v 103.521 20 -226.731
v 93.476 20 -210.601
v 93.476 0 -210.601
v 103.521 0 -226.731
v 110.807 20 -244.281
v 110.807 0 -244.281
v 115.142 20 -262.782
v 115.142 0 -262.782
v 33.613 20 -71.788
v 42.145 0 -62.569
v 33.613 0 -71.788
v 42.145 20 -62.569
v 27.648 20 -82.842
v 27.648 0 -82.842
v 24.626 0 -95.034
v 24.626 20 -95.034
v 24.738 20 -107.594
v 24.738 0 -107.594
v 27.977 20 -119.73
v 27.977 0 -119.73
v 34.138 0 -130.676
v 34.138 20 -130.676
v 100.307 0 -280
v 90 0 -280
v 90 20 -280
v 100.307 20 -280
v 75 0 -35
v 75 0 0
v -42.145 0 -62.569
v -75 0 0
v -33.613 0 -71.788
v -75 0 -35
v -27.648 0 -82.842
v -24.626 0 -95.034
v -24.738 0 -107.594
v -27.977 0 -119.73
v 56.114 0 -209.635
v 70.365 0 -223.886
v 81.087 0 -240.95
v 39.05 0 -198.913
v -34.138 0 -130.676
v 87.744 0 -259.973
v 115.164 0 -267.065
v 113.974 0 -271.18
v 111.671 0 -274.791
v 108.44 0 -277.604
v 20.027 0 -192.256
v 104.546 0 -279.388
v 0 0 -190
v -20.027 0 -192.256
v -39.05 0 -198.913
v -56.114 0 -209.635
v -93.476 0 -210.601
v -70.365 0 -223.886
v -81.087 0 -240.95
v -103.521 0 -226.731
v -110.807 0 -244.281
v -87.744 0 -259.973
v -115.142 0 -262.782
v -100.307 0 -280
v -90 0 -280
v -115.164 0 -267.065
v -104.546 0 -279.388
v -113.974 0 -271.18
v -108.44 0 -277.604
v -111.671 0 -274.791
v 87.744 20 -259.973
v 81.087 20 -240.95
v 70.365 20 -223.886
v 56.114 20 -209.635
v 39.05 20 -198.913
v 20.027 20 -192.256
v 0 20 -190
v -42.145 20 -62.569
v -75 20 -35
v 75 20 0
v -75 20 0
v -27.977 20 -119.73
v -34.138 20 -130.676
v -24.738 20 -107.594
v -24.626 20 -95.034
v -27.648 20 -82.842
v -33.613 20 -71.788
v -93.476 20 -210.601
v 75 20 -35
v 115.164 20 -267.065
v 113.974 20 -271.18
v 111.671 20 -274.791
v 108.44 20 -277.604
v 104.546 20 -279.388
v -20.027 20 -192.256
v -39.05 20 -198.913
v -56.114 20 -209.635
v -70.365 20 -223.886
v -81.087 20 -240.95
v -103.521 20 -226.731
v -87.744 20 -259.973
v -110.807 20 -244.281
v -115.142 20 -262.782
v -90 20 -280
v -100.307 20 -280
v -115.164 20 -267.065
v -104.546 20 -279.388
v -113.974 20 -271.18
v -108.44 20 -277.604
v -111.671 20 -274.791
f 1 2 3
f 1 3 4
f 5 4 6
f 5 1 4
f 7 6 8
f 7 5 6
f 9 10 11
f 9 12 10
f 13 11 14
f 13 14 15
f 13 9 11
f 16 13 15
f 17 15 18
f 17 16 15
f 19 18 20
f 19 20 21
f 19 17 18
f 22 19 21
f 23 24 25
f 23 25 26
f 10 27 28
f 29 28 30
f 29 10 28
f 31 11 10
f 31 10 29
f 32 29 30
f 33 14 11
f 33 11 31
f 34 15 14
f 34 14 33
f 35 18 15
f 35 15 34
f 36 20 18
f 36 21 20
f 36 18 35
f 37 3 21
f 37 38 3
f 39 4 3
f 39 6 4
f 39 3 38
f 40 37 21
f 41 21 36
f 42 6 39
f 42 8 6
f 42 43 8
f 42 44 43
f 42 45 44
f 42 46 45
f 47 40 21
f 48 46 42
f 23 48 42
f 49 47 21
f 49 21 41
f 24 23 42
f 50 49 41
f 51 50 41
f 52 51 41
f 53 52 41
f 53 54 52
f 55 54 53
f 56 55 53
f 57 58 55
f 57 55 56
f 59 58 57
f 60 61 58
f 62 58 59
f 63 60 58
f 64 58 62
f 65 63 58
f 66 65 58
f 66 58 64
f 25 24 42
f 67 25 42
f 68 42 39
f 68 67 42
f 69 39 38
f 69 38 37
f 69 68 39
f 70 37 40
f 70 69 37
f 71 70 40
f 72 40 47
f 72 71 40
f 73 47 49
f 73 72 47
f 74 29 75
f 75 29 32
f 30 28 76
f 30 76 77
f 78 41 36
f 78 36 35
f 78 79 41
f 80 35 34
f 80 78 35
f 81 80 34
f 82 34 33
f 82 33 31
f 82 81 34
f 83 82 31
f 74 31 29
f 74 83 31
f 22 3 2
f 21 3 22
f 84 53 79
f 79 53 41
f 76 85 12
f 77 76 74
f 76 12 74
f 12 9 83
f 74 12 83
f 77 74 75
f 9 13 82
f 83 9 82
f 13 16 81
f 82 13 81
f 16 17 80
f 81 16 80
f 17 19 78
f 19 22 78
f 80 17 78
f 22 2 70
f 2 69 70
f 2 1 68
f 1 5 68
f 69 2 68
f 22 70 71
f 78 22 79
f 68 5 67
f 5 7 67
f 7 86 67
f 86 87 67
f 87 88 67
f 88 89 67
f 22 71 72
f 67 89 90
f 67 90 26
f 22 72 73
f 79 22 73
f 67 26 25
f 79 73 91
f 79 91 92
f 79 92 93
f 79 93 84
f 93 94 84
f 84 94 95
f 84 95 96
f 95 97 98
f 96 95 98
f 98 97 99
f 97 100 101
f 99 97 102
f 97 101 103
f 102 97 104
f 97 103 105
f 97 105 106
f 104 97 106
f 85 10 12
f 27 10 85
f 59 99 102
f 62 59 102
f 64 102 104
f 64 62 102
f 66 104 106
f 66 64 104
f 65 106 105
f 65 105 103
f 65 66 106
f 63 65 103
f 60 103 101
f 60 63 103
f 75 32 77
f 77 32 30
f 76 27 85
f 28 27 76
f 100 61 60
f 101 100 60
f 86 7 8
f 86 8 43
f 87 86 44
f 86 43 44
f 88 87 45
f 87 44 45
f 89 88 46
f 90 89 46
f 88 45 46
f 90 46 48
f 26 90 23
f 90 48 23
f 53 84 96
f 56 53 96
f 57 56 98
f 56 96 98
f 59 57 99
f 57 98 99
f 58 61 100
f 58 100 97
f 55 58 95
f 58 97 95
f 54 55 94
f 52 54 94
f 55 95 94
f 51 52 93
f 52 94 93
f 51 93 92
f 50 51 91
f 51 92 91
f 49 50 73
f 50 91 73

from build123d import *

# Parameters (mm, degrees)
BOSS_EXTRUDE1_DEPTH  = 20
FILLET1_R            = 50
CUT_EXTRUDE3_DEPTH   = 20
FILLET3_R            = 15
FILLET1_OF_MIRROR2_R = 50
FILLET3_OF_MIRROR2_R = 15


with BuildPart() as part:
    # Sketch1 → Boss-Extrude1 (new body)
    with BuildSketch(Plane(origin=(0, 0, 0), x_dir=(1, 0, 0), z_dir=(0, 1, 0))):
        Polygon((-75, 35), (-75, 0), (0, 0), (0, 280), (-145, 280), (-6.056000119, 92.850884872), align=None)
    boss_extrude1 = extrude(amount=BOSS_EXTRUDE1_DEPTH)

    # Fillet1
    fillet1_edges = [part.edges().sort_by_distance(p)[0] for p in [
        (-6.056000119, 10, -92.850884872),
    ]]
    fillet(fillet1_edges, radius=FILLET1_R)

    # Sketch5 → Cut-Extrude3 (cut)
    with BuildSketch(Plane(origin=(0, 20, 0), x_dir=(1, 0, 0), z_dir=(0, 1, 0))):
        with BuildLine():
            Line((0, 190), (0, 280))
            Line((0, 280), (-90, 280))
            ThreePointArc((-90, 280), (-63.639610307, 216.360389693), (0, 190))
        make_face()
        with BuildLine():
            Line((-145, 280), (-93.476414041, 210.60086417))
            ThreePointArc((-93.476414041, 210.60086417), (-110.536849713, 243.452976984), (-116.421991204, 280))
            Line((-116.421991204, 280), (-145, 280))
        make_face()
    cut_extrude3 = extrude(amount=-CUT_EXTRUDE3_DEPTH, mode=Mode.SUBTRACT)

    # Fillet3
    fillet3_edges = [part.edges().sort_by_distance(p)[0] for p in [
        (-116.421991204, 10, -280),
    ]]
    fillet(fillet3_edges, radius=FILLET3_R)

    # Mirror2: Boss-Extrude1, Cut-Extrude3 across plane
    add(boss_extrude1.mirror(Plane(origin=(0, 20, 0), x_dir=(0, 0, 1), z_dir=(-1, 0, 0))))
    add(cut_extrude3.mirror(Plane(origin=(0, 20, 0), x_dir=(0, 0, 1), z_dir=(-1, 0, 0))), mode=Mode.SUBTRACT)

    # Fillet1 of Mirror2
    fillet1_of_mirror2_edges = [part.edges().sort_by_distance(p)[0] for p in [
        (6.056000119, 10, -92.850884872),
    ]]
    fillet(fillet1_of_mirror2_edges, radius=FILLET1_OF_MIRROR2_R)

    # Fillet3 of Mirror2
    fillet3_of_mirror2_edges = [part.edges().sort_by_distance(p)[0] for p in [
        (116.421991204, 10, -280),
    ]]
    fillet(fillet3_of_mirror2_edges, radius=FILLET3_OF_MIRROR2_R)


solid = part.part
